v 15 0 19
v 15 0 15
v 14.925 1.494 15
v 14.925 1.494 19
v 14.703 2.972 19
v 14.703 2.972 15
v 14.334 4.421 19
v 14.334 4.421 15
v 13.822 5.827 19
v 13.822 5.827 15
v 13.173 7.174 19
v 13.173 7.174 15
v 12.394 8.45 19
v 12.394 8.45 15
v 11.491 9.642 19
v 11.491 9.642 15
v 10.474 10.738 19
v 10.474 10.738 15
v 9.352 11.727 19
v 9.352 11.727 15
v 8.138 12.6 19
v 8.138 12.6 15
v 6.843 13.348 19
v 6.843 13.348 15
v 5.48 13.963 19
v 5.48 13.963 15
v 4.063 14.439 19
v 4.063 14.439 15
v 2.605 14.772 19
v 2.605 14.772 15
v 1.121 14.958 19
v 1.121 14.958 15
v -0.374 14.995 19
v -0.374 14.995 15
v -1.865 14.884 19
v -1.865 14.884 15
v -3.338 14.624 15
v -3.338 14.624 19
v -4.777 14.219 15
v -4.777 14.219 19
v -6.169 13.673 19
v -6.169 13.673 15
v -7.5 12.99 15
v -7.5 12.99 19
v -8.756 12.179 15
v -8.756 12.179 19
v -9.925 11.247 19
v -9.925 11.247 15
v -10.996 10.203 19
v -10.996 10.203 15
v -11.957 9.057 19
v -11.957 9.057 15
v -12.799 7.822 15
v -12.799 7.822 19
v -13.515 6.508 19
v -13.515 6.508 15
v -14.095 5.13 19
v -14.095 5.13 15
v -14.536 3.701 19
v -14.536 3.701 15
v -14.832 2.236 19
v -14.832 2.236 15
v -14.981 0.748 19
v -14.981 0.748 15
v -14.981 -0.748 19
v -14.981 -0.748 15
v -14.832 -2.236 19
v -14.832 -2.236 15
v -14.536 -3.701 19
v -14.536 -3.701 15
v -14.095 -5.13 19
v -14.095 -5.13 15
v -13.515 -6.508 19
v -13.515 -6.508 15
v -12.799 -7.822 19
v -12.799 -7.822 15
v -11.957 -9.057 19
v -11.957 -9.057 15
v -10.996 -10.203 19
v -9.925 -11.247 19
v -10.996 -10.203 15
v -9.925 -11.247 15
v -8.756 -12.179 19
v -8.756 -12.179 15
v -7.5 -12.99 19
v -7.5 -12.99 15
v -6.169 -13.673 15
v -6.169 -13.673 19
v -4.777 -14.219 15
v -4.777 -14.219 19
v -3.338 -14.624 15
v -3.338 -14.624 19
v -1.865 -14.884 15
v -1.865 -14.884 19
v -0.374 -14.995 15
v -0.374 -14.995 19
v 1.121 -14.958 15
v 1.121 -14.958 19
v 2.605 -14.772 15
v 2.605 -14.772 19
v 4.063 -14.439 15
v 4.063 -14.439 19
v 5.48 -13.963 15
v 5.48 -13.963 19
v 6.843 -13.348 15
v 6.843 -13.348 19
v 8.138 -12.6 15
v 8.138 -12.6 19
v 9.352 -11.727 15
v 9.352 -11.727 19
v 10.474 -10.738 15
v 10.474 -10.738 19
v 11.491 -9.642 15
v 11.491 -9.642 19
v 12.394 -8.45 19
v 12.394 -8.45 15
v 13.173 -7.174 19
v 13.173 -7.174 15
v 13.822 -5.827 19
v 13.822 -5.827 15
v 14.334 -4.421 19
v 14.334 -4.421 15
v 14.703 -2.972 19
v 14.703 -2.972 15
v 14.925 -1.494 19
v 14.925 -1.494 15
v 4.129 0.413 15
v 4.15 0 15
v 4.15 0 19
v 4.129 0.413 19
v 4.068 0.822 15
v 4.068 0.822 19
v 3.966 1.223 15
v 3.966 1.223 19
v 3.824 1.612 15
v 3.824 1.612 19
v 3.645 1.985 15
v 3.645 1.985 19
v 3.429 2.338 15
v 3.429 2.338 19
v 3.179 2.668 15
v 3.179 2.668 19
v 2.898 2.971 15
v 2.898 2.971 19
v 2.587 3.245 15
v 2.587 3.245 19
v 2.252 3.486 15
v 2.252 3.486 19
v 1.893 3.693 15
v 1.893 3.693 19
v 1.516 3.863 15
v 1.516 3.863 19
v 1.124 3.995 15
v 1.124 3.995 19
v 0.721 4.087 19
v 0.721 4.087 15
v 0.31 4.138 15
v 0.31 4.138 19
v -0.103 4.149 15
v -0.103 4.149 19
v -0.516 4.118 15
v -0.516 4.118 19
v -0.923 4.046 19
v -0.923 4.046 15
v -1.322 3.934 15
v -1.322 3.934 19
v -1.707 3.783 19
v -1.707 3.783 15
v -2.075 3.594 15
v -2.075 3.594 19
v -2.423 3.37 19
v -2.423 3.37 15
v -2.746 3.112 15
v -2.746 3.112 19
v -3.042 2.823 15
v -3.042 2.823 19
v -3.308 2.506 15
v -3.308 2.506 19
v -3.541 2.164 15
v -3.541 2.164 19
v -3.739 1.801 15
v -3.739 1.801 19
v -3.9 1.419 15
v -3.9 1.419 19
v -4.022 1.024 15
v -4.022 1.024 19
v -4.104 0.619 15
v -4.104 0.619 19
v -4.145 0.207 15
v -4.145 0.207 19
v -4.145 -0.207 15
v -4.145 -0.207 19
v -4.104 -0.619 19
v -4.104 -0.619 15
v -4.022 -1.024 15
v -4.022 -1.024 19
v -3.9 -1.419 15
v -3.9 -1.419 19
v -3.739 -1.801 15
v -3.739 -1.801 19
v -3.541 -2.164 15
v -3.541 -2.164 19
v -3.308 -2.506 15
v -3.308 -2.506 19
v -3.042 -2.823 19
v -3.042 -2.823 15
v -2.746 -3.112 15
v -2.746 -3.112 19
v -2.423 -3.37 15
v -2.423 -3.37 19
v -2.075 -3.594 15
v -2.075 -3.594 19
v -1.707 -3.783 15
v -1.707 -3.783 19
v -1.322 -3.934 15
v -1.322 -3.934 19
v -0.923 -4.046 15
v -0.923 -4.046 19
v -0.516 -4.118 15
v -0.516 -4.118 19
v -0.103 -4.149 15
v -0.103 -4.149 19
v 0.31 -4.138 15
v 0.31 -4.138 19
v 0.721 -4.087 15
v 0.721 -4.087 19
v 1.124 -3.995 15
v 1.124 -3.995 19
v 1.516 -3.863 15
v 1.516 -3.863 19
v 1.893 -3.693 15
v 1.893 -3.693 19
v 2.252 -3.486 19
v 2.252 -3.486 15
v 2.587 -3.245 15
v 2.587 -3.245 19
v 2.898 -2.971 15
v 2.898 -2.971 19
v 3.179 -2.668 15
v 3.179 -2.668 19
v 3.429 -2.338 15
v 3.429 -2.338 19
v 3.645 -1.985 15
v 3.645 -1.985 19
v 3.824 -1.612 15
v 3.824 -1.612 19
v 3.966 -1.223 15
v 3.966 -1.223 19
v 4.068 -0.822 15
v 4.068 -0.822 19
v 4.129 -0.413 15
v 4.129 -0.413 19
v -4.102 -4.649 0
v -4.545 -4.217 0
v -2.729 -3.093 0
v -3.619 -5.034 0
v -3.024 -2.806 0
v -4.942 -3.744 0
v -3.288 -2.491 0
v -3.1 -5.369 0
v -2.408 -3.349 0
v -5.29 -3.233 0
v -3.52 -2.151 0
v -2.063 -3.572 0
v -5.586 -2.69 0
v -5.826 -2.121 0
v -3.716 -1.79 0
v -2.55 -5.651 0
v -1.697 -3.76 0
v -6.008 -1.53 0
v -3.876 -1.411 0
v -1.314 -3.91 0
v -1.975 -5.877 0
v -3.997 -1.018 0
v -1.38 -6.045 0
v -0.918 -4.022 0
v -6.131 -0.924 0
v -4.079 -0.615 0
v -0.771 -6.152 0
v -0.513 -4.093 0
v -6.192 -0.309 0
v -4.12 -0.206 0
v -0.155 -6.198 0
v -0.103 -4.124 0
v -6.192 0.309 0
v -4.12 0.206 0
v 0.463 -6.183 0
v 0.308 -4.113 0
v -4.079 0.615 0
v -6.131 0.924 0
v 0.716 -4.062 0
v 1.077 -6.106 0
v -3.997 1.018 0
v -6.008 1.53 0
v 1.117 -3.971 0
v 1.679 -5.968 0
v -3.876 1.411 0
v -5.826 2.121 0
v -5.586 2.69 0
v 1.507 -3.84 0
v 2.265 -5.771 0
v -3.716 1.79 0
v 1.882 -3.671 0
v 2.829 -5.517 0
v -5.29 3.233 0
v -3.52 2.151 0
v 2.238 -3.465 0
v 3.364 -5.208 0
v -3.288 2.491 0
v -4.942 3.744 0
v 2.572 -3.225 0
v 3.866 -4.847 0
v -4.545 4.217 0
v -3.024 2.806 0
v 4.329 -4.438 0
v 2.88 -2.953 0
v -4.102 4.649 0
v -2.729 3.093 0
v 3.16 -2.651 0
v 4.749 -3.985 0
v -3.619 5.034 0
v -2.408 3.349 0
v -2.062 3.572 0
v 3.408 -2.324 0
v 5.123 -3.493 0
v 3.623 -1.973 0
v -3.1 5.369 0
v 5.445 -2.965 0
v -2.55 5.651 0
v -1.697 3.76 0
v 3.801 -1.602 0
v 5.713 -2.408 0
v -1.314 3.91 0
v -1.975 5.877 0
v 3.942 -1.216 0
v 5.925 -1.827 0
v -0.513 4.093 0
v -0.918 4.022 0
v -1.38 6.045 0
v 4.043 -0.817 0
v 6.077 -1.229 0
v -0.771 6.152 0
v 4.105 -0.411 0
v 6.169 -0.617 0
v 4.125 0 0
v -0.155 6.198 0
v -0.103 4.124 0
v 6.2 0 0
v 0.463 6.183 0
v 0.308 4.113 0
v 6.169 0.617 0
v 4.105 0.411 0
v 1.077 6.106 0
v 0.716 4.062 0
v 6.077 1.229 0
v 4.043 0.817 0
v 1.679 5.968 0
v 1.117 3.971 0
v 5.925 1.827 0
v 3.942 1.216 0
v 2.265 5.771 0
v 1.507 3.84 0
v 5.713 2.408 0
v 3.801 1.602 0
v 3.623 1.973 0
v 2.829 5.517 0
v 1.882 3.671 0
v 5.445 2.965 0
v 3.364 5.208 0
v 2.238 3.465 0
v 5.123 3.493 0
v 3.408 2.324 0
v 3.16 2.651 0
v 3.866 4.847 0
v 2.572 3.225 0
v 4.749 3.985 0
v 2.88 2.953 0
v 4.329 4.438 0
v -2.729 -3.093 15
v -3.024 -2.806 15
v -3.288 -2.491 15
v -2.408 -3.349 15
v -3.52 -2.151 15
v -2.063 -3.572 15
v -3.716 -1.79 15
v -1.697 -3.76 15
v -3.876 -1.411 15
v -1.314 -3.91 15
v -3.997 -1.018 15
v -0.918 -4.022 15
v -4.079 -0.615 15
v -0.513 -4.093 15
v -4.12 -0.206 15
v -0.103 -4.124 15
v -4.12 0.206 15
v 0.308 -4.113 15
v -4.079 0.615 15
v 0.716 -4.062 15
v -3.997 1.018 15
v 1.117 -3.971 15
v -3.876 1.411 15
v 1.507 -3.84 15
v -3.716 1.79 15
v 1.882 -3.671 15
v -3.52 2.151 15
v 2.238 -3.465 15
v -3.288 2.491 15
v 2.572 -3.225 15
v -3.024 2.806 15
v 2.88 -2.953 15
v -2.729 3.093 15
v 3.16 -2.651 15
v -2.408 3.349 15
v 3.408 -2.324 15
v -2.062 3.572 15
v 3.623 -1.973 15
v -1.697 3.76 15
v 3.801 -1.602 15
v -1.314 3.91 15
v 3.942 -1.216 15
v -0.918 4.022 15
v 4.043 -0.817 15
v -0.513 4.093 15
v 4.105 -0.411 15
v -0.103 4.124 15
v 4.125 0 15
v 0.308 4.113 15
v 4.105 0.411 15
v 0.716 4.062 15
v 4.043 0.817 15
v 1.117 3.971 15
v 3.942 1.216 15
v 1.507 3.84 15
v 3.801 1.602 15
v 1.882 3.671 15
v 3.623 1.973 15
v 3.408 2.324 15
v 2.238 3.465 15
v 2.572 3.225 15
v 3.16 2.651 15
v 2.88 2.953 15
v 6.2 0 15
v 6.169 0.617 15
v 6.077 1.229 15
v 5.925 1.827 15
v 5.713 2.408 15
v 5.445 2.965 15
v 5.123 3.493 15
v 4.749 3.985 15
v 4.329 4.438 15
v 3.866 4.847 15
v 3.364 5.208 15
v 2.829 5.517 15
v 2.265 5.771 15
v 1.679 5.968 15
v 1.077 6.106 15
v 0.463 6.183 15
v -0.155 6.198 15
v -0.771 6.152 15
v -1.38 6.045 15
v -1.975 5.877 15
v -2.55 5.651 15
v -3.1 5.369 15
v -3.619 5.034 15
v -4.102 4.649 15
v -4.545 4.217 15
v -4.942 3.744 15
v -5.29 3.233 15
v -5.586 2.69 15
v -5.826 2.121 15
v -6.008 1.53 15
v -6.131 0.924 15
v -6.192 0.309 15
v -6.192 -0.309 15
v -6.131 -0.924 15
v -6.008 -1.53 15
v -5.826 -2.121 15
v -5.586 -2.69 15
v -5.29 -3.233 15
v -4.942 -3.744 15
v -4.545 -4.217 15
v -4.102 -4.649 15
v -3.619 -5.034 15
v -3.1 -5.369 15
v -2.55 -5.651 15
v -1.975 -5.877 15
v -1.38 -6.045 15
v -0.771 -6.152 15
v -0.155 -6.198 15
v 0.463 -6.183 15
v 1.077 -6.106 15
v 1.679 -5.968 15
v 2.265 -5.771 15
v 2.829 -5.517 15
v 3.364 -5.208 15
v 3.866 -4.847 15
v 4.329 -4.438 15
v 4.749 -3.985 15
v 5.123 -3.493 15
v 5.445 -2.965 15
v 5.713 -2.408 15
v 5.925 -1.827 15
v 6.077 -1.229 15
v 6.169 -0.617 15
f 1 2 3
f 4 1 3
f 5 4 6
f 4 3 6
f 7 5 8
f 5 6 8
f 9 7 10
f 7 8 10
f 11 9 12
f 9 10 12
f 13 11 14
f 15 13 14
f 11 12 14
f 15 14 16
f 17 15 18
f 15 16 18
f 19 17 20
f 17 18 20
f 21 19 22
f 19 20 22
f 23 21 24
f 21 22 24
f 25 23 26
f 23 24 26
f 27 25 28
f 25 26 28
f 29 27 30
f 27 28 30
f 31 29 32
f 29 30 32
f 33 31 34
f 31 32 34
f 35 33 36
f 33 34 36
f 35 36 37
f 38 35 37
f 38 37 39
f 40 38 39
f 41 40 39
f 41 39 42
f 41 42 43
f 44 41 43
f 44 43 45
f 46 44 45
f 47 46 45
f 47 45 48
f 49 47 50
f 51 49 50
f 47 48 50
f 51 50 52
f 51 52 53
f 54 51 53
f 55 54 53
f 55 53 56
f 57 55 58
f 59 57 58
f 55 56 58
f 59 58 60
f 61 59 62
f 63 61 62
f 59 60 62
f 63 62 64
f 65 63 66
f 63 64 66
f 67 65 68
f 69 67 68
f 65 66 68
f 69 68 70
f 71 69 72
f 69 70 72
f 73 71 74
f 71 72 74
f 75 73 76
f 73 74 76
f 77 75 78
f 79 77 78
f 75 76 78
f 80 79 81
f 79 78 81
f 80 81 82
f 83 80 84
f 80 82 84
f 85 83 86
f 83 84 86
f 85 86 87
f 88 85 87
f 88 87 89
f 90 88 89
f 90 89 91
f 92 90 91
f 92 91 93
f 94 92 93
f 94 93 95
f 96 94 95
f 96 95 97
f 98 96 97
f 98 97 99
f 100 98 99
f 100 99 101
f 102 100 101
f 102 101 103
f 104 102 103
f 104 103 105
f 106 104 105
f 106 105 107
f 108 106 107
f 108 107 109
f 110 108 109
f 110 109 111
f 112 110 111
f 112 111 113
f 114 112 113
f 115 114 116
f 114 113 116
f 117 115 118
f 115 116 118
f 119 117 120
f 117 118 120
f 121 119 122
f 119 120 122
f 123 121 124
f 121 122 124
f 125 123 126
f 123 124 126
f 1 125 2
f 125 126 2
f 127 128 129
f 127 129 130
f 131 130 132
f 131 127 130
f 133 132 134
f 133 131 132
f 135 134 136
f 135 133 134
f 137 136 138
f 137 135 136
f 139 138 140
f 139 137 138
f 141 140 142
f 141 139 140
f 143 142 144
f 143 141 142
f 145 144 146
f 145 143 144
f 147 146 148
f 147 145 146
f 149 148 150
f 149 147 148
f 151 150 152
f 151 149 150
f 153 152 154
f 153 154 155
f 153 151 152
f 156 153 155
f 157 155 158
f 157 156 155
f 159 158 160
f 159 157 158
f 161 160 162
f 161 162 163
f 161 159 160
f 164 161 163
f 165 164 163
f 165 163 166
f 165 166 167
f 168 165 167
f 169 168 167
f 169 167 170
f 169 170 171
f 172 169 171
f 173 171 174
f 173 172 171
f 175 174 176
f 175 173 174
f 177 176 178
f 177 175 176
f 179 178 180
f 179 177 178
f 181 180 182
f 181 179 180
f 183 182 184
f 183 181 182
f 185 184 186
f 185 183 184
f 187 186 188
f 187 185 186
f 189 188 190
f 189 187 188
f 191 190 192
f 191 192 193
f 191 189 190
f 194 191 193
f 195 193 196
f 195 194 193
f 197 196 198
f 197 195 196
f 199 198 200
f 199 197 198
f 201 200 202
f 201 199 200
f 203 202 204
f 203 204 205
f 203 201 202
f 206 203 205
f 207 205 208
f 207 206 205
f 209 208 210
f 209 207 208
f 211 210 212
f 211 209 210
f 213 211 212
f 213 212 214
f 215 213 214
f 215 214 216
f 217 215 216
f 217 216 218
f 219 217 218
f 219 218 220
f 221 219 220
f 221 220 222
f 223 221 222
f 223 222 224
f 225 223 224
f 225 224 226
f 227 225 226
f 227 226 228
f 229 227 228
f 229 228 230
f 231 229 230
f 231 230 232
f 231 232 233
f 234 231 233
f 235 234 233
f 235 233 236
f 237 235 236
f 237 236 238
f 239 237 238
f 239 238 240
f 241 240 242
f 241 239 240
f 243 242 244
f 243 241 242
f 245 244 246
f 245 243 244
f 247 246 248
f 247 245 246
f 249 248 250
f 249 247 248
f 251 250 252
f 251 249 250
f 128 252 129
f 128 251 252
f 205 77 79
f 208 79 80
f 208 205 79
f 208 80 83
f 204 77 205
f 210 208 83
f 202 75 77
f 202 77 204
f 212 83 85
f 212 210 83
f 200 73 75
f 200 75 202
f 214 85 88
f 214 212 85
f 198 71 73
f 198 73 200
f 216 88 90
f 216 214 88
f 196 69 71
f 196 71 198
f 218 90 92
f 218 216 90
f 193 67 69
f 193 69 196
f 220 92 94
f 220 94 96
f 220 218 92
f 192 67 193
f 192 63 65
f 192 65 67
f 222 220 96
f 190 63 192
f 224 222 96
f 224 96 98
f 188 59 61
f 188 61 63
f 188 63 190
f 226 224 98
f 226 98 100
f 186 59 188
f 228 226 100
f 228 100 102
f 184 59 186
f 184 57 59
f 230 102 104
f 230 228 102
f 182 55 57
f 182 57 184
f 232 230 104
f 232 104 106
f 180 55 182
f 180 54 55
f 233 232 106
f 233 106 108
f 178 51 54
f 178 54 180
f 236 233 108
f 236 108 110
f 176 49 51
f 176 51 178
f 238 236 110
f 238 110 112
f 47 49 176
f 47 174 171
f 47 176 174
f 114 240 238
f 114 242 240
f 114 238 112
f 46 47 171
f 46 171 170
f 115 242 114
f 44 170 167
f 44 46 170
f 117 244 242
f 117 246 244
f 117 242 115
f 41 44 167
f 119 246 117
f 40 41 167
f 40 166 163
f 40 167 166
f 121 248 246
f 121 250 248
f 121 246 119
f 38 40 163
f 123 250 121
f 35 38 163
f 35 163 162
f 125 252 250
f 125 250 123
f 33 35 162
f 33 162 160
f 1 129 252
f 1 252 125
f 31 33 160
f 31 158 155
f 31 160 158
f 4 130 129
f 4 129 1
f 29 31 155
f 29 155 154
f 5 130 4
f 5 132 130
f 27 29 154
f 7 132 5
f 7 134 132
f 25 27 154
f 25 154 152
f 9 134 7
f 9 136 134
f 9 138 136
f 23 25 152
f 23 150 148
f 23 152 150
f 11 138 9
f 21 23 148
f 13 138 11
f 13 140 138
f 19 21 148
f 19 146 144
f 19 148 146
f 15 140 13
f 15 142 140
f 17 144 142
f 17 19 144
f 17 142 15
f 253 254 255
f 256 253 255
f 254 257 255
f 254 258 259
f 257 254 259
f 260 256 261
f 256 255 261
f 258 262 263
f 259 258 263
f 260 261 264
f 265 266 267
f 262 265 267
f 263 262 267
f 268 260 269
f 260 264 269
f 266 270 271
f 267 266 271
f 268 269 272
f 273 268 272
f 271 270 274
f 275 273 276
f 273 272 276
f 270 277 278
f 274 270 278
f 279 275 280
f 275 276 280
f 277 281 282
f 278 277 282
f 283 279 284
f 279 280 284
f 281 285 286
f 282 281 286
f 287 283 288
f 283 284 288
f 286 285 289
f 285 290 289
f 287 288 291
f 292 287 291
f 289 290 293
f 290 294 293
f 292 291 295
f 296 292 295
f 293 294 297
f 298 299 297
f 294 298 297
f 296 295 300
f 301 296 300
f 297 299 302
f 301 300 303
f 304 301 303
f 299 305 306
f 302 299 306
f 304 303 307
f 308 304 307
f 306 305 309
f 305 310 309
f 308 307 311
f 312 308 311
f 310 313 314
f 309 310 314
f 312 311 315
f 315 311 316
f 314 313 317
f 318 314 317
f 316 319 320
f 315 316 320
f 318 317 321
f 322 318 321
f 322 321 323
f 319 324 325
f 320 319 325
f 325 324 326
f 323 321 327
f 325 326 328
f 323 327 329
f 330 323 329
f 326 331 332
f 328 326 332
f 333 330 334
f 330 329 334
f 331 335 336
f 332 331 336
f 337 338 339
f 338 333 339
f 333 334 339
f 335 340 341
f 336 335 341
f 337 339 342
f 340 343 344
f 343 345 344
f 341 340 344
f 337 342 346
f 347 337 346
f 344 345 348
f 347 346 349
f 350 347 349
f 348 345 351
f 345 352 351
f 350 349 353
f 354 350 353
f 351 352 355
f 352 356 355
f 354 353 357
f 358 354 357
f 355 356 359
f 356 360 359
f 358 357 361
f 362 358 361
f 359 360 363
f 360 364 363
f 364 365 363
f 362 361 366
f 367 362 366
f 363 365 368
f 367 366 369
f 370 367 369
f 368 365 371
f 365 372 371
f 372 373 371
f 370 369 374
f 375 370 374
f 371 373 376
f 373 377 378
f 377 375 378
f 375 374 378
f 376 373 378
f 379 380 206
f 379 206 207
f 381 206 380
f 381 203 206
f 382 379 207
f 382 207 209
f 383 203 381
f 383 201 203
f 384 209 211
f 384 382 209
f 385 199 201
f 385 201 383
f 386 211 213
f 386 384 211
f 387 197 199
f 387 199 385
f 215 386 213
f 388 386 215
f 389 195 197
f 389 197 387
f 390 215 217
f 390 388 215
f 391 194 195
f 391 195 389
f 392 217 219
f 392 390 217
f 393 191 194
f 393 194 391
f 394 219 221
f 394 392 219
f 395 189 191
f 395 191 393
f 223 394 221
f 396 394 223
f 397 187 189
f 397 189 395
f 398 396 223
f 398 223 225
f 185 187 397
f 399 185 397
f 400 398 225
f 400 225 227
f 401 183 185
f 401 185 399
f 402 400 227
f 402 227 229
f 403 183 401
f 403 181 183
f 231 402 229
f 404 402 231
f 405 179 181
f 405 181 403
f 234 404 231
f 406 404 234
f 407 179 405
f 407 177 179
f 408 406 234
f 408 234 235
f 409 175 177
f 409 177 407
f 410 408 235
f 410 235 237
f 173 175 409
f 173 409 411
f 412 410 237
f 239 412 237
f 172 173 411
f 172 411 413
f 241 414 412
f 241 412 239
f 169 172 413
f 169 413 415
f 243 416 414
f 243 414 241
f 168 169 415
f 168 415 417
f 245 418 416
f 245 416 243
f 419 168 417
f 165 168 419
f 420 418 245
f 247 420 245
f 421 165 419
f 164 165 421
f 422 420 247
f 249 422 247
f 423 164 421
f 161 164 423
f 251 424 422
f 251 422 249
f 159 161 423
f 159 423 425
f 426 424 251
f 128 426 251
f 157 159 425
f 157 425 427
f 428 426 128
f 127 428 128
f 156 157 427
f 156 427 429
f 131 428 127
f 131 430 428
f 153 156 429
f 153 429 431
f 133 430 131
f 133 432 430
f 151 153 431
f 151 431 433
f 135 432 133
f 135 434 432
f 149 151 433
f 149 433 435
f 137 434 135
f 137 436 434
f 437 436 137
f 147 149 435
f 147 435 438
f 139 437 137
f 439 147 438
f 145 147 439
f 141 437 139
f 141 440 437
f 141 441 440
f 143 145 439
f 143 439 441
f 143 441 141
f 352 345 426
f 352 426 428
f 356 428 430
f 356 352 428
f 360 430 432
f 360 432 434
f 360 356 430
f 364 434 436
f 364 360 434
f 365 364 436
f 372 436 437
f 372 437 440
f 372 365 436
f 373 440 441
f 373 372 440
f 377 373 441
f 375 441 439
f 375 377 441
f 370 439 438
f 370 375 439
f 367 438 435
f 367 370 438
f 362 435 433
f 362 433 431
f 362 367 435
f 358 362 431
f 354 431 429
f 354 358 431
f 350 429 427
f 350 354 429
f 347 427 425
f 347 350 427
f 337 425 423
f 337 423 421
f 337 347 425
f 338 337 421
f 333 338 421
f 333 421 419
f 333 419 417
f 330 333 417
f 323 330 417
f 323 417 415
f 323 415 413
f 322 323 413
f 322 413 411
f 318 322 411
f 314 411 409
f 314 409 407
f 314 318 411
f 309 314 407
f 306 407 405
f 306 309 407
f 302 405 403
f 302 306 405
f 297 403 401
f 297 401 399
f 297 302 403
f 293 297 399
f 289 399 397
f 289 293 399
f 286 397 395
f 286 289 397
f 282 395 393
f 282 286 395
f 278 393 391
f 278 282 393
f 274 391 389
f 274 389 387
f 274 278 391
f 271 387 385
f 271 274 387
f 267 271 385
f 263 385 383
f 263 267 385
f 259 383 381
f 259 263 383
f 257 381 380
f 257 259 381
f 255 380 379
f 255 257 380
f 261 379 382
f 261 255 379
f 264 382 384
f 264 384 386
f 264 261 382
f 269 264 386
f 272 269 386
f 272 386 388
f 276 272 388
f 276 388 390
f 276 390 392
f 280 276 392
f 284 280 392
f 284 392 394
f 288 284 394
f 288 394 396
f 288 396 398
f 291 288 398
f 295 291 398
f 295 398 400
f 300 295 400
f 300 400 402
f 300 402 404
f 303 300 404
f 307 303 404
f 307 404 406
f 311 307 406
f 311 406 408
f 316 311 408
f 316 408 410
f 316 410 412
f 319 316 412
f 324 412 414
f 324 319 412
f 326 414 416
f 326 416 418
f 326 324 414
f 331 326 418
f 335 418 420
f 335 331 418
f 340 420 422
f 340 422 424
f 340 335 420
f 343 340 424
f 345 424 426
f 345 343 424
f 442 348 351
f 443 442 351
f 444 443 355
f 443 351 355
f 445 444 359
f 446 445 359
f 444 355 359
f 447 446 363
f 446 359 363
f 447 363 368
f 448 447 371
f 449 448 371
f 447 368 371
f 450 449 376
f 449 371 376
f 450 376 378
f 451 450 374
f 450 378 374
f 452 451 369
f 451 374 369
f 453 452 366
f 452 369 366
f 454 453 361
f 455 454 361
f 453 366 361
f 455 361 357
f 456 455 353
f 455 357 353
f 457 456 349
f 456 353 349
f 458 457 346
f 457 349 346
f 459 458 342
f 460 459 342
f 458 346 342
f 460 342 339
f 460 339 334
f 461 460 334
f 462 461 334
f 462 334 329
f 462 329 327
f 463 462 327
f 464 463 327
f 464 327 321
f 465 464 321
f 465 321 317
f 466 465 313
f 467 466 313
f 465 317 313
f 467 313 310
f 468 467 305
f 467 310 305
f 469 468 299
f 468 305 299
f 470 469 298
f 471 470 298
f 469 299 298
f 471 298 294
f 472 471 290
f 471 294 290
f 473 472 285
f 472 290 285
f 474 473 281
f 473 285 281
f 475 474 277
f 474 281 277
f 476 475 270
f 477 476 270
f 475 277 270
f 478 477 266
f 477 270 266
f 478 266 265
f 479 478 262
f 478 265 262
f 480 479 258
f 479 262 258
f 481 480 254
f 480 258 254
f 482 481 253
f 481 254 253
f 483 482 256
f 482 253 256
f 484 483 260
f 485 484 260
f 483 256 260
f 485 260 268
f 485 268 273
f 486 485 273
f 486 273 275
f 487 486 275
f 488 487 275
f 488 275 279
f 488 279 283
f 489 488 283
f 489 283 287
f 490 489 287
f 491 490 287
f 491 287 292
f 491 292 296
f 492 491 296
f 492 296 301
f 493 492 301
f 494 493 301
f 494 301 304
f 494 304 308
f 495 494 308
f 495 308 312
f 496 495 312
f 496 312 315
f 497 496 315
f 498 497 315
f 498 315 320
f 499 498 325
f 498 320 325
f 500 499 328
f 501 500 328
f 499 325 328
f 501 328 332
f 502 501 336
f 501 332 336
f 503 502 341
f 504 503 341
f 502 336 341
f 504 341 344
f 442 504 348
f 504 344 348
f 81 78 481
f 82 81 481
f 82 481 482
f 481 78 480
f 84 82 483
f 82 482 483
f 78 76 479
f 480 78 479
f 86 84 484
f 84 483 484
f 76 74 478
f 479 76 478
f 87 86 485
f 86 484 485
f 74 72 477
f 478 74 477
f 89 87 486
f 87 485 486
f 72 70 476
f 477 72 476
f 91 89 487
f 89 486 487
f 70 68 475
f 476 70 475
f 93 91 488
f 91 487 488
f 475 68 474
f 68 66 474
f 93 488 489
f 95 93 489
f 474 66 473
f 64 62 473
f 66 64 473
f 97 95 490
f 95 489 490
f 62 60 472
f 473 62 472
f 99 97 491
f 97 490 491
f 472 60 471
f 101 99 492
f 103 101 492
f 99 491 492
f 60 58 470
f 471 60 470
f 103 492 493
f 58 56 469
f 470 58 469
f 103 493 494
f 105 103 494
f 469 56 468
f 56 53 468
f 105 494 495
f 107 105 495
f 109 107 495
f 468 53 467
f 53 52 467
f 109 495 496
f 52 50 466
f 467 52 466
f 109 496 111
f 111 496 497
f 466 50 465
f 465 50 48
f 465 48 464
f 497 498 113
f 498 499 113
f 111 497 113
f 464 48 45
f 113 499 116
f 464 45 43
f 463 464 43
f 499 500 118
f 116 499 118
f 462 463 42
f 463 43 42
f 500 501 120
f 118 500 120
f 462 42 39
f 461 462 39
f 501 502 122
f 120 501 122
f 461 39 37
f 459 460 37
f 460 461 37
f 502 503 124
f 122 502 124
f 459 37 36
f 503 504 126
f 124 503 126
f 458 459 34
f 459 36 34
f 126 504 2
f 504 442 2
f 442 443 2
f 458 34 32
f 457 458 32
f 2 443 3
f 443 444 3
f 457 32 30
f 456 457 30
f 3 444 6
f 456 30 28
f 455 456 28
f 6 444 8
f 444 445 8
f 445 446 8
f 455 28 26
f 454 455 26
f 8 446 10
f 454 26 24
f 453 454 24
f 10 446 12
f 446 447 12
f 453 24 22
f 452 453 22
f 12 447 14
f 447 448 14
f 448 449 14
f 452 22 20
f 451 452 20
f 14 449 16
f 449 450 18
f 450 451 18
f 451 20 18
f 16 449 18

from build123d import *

# Parameters (mm, degrees)
SKETCH_R      = 6.2
SKETCH_R_2    = 4.125
PAD_DEPTH     = 15
SKETCH001_R   = 15
SKETCH001_R_2 = 4.15
PAD001_DEPTH  = 4


with BuildPart() as part:
    # Sketch → Pad (new body)
    with BuildSketch(Plane.XY):
        Circle(SKETCH_R)
        Circle(SKETCH_R_2, mode=Mode.SUBTRACT)
    extrude(amount=PAD_DEPTH)

    # Sketch001 (on Face4 of Pad) → Pad001 (join)
    with BuildSketch(Plane.XY.offset(15)):
        Circle(SKETCH001_R)
        Circle(SKETCH001_R_2, mode=Mode.SUBTRACT)
    extrude(amount=PAD001_DEPTH)


solid = part.part
